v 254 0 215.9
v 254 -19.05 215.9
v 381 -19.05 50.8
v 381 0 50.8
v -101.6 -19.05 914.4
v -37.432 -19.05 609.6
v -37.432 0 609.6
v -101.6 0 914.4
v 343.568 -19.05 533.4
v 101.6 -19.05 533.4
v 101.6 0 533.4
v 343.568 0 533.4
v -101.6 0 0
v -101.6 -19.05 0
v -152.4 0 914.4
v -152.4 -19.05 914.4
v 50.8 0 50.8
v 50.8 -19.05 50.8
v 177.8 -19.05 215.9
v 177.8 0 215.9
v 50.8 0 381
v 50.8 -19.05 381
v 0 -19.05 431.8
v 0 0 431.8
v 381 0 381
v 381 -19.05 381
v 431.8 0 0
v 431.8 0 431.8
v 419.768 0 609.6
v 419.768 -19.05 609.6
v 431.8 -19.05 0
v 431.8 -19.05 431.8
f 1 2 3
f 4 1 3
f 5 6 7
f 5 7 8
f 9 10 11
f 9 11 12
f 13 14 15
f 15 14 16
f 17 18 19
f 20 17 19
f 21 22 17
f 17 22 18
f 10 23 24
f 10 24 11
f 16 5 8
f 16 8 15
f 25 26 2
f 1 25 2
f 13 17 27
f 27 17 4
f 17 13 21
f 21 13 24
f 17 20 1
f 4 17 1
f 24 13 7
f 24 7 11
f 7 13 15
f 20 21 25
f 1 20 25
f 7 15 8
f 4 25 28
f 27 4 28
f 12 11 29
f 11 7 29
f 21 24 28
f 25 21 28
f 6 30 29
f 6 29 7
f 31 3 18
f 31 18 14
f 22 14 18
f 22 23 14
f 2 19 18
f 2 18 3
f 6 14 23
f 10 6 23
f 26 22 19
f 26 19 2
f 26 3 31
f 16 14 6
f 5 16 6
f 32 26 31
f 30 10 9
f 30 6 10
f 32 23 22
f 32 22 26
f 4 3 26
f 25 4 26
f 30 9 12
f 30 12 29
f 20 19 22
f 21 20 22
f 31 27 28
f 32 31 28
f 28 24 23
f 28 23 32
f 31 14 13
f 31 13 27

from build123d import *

# Parameters (mm, degrees)
F0_W     = 431.8
F0_H     = 431.8
F1_DEPTH = 19.05
F3_DEPTH = 19.051
F5_DEPTH = 19.05
F7_DEPTH = 19.051
F9_DEPTH = 19.05


with BuildPart() as f1:
    # F0 (on Front) → F1 (new body)
    with BuildSketch(Plane.XZ):
        with Locations((215.9, 215.9)):
            Rectangle(F0_W, F0_H)
    extrude(amount=F1_DEPTH)

    # F2 (on face) → F3 (cut, through all)
    with BuildSketch(Plane.XZ.offset(19.05)):
        Polygon((177.8, 215.9), (50.8, 381), (50.8, 50.8), align=None)
        Polygon((381, 50.8), (381, 381), (254, 215.9), align=None)
    extrude(amount=-F3_DEPTH, mode=Mode.SUBTRACT)

    # F4 (on face) → F5 (join, through all)
    with BuildSketch(Plane.XZ.offset(19.05)):
        Polygon((0, 0), (0, 431.8), (-101.6, 914.4), (-152.4, 914.4), (-152.4, 0), align=None)
    extrude(amount=-F5_DEPTH)

    # F6 (on face) → F7 (cut, through all)
    with BuildSketch(Plane.XZ.offset(19.05)):
        Polygon((-101.6, 0), (-152.4, 914.4), (-152.4, 0), align=None)
    extrude(amount=-F7_DEPTH, mode=Mode.SUBTRACT)

    # F8 (on face) → F9 (join)
    with BuildSketch(Plane.XZ.offset(19.05)):
        Polygon((419.768421, 609.6), (-37.431579, 609.6), (0, 431.8), (101.6, 533.4), (343.568421, 533.4), align=None)
    extrude(amount=-F9_DEPTH)


solid = f1.part
